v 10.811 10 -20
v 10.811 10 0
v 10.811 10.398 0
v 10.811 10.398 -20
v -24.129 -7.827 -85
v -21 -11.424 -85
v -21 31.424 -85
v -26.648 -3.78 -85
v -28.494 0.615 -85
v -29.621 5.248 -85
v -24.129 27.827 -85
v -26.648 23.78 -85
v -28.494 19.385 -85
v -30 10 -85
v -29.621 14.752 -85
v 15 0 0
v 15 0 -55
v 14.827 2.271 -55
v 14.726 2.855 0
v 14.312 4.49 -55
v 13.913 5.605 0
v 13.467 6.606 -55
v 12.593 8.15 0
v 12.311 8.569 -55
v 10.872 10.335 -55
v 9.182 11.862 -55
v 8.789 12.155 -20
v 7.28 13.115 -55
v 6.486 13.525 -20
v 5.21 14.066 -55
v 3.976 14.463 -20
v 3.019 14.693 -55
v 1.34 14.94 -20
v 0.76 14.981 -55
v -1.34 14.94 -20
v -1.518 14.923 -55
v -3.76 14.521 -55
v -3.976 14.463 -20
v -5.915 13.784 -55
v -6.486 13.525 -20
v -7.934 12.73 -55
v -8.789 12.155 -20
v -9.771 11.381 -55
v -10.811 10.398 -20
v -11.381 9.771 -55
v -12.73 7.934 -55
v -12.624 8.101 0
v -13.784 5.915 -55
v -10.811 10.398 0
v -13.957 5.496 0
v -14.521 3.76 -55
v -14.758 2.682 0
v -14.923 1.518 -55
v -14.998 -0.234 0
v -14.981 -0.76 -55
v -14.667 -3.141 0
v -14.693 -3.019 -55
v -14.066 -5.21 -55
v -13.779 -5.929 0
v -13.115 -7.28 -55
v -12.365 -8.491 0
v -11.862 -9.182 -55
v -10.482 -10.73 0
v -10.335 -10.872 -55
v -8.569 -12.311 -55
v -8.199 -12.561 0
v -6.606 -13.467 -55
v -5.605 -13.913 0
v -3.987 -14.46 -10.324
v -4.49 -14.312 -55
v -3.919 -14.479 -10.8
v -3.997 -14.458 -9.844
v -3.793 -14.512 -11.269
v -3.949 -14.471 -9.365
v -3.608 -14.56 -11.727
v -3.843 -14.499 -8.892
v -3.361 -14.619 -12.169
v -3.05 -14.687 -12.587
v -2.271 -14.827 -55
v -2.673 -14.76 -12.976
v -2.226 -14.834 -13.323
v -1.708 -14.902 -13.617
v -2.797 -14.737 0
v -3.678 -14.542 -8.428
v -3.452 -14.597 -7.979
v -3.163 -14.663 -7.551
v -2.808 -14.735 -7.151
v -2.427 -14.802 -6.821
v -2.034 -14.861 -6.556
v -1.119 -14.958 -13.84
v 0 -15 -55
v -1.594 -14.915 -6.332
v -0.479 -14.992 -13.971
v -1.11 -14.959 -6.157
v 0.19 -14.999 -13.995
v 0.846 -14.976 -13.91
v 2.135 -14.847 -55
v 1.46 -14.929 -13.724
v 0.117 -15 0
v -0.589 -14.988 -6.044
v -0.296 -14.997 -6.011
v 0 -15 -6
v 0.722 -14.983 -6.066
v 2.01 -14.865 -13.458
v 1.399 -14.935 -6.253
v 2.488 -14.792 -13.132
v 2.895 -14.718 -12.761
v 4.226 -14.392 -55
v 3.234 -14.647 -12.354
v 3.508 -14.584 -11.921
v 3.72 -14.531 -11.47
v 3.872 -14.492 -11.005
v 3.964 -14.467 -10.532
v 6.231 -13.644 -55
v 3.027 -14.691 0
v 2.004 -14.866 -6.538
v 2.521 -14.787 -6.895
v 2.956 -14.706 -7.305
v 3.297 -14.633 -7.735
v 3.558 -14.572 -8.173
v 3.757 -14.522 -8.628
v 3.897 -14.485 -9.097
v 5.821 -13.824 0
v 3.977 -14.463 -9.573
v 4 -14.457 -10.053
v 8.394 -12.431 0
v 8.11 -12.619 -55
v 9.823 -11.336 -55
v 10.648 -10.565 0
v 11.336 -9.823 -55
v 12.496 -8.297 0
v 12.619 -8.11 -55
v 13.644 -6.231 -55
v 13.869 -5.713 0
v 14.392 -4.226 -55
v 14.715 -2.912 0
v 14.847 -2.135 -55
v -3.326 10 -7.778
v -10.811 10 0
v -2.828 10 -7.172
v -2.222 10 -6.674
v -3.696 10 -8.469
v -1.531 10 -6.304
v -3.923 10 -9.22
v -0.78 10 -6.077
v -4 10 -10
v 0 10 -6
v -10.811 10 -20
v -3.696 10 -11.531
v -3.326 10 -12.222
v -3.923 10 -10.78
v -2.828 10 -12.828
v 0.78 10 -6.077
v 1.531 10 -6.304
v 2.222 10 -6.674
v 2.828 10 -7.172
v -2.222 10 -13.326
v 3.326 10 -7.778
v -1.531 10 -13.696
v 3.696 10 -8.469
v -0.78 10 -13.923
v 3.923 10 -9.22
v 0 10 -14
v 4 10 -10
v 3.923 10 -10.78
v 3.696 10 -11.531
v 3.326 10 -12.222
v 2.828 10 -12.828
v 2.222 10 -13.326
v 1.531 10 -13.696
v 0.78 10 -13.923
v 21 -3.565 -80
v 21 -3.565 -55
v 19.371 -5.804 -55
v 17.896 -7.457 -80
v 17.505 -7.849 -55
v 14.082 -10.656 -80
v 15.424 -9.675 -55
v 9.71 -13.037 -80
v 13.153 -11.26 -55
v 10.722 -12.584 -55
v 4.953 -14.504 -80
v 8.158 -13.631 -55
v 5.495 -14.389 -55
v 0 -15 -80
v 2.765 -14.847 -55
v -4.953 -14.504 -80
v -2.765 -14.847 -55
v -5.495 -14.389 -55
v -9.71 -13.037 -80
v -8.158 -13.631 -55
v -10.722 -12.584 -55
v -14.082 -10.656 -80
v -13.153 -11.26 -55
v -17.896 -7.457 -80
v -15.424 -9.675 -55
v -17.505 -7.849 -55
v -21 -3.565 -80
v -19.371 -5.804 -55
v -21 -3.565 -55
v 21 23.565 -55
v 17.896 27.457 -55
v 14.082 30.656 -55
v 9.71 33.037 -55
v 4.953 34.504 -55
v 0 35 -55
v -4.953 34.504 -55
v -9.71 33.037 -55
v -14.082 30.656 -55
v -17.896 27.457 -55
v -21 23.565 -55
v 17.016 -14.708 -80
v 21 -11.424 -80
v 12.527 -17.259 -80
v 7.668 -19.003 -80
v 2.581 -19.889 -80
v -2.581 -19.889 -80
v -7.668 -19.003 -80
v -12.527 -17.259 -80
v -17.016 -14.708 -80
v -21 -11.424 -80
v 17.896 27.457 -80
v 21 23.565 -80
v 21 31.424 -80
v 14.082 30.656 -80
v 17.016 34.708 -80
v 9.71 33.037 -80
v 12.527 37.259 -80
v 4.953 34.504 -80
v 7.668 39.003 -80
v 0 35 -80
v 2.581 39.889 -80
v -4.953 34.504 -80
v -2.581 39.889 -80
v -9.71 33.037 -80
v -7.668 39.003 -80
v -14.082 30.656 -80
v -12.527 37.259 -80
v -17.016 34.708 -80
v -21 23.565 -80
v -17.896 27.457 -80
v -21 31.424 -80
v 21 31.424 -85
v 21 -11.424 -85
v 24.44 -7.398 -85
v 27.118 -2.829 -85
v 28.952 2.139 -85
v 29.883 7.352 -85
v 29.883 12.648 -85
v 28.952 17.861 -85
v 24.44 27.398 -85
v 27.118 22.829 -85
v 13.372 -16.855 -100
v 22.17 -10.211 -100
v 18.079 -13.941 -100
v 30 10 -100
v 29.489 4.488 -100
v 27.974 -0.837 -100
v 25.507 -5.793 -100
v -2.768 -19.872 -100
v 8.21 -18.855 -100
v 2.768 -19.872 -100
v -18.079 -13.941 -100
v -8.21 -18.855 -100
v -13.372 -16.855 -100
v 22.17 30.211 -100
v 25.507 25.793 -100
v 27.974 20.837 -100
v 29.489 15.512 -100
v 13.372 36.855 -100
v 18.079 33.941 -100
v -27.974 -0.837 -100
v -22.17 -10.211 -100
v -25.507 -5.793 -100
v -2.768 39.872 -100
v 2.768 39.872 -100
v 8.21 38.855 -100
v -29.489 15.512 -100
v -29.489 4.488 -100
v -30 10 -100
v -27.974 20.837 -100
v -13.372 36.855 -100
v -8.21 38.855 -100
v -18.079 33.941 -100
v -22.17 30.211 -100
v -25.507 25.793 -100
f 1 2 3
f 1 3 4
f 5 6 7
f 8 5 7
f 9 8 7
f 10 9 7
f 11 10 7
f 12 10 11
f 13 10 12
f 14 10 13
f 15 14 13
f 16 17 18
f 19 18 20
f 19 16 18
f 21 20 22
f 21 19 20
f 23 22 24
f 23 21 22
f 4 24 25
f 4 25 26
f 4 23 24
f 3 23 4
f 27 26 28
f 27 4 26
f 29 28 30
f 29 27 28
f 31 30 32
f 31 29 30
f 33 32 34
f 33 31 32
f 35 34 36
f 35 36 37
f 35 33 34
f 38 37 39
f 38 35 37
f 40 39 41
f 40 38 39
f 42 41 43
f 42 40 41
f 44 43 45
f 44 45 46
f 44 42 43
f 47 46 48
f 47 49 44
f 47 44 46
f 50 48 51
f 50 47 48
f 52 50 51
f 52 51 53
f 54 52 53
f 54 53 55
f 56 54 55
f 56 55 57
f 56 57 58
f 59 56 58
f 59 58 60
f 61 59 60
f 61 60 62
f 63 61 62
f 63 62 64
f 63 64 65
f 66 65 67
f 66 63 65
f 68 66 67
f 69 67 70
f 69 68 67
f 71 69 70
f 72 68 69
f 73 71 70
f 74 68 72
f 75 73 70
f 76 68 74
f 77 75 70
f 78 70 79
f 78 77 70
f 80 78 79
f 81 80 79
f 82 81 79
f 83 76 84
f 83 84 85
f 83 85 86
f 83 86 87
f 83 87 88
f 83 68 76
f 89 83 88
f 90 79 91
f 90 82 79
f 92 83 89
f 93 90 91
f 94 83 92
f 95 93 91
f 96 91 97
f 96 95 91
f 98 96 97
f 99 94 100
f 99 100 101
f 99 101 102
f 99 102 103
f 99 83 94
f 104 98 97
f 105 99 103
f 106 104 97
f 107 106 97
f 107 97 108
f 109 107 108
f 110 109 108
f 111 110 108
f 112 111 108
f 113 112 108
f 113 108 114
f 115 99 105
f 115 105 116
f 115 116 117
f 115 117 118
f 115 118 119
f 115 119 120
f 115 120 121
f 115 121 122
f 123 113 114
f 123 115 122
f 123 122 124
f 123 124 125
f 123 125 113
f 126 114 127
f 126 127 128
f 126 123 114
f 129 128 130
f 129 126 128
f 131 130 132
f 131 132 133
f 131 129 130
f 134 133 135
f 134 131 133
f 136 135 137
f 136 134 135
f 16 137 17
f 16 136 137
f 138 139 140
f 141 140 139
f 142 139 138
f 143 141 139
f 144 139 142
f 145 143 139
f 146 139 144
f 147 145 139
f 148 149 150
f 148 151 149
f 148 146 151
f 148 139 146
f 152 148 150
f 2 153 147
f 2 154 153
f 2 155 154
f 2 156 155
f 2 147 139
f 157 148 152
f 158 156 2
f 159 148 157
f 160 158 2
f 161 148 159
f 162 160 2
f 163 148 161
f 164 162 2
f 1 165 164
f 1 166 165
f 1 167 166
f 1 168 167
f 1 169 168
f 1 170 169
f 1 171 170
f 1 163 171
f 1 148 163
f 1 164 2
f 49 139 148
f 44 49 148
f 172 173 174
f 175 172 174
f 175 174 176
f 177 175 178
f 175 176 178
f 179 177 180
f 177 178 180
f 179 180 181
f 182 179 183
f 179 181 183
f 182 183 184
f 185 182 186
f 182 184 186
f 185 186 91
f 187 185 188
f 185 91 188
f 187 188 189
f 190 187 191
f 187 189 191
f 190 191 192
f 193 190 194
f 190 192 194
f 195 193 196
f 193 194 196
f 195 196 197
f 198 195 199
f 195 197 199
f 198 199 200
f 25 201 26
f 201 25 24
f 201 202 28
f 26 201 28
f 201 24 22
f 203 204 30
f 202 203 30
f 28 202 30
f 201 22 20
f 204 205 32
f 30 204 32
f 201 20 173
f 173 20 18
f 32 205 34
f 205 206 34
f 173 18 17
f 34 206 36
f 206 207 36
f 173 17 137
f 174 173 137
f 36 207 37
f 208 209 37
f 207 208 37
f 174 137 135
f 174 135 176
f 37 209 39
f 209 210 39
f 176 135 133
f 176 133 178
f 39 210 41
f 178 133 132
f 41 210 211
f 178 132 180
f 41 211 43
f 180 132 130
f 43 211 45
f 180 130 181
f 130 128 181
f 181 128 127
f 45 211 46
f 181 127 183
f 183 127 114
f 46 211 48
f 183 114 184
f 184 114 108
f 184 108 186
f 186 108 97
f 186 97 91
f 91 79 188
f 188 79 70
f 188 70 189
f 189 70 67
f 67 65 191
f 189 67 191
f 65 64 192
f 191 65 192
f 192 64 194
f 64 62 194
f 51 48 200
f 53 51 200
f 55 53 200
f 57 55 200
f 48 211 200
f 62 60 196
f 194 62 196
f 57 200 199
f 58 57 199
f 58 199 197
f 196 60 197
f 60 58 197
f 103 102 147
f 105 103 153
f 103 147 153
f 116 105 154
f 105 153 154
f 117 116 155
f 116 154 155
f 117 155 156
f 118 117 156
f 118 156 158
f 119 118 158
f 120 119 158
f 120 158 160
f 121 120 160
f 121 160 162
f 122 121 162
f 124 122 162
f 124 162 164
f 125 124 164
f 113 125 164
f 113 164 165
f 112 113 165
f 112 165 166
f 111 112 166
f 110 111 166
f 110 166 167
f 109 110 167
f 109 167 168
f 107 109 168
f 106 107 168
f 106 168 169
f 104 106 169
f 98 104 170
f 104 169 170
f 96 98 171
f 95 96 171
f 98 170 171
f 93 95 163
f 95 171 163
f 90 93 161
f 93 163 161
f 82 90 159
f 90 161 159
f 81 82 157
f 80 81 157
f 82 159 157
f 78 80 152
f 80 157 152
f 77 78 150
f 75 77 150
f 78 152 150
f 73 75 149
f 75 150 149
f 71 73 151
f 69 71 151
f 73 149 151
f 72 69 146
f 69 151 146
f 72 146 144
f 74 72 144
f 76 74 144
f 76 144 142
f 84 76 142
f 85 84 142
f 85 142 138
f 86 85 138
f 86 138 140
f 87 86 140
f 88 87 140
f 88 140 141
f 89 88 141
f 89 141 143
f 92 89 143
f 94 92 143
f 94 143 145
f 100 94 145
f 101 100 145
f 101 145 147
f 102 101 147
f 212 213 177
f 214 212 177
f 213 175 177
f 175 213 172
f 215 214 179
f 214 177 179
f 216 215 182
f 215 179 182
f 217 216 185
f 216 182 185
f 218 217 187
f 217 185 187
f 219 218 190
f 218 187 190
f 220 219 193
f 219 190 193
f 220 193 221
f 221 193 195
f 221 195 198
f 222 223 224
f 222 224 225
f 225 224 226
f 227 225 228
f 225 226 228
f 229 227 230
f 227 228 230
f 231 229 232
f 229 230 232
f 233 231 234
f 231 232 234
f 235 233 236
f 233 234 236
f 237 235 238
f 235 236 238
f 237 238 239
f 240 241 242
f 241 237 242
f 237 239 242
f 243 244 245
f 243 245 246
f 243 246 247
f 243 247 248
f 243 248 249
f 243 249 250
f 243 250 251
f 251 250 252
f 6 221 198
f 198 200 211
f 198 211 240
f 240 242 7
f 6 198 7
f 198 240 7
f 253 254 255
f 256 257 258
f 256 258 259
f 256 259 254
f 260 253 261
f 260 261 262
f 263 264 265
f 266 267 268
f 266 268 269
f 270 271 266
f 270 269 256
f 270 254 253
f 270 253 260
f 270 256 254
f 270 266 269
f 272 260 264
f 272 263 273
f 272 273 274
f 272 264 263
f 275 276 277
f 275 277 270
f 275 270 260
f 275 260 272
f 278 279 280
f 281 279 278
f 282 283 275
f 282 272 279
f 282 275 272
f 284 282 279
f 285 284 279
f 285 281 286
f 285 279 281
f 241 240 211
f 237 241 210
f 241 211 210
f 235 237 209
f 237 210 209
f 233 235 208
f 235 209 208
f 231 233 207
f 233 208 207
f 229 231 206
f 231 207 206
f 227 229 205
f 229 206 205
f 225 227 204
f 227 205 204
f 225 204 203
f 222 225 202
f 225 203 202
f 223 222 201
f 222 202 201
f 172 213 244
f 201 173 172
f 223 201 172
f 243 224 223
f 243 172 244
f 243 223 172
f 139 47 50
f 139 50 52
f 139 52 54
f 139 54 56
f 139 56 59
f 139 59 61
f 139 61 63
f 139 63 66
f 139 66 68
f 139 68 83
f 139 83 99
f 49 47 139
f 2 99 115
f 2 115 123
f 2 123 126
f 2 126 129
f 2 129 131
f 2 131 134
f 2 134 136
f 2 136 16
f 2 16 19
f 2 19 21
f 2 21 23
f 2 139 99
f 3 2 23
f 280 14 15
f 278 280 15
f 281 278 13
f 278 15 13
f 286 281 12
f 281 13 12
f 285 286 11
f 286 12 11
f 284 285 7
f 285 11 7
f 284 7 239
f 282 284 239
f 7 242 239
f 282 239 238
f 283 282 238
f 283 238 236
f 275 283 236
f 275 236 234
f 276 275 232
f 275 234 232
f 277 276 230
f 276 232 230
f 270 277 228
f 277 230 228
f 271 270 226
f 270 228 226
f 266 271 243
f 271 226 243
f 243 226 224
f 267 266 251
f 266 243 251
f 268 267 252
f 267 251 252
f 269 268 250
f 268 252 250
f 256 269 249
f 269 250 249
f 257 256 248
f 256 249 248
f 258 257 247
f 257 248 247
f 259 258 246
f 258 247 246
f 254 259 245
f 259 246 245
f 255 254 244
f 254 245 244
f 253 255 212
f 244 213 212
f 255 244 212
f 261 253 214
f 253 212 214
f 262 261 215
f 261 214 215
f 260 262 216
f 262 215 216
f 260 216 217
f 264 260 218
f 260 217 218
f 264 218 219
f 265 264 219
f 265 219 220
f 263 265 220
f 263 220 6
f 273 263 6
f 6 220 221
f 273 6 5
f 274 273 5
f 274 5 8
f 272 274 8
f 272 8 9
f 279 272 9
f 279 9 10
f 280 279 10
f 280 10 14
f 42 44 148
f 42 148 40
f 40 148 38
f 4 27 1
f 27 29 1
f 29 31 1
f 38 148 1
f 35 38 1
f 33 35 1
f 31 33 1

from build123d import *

# Parameters (mm, degrees)
IZIM1_R                     = 15
Y_KSEKLIK_EKSTR_ZYON1_DEPTH = 55
IZIM2_R                     = 25
Y_KSEKLIK_EKSTR_ZYON2_DEPTH = 25
IZIM3_R                     = 30
Y_KSEKLIK_EKSTR_ZYON3_DEPTH = 20
IZIM4_W                     = 21.622627276
IZIM4_H                     = 20
KES_EKSTR_ZYON1_DEPTH       = 20
IZIM6_R                     = 4
KES_EKSTR_ZYON2_DEPTH       = 30
KES_EKSTR_ZYON3_DEPTH       = 30


with BuildPart() as part:
    # Çizim1 → Yükseklik-Ekstrüzyon1 (new body)
    with BuildSketch(Plane.XY):
        Circle(IZIM1_R)
    extrude(amount=-Y_KSEKLIK_EKSTR_ZYON1_DEPTH)

    # Çizim2 → Yükseklik-Ekstrüzyon2 (add)
    with BuildSketch(Plane(origin=(0, 0, -55), x_dir=(-1, 0, 0), z_dir=(0, 0, -1))):
        with Locations(Location((0, 10, 0), (0, 0, 270))):
            Circle(IZIM2_R)
    extrude(amount=Y_KSEKLIK_EKSTR_ZYON2_DEPTH)

    # Çizim3 → Yükseklik-Ekstrüzyon3 (add)
    with BuildSketch(Plane(origin=(0, 0, -80), x_dir=(-1, 0, 0), z_dir=(0, 0, -1))):
        with Locations((0, 10)):
            Circle(IZIM3_R)
    extrude(amount=Y_KSEKLIK_EKSTR_ZYON3_DEPTH)

    # Çizim4 → Kes-Ekstrüzyon1 (cut)
    with BuildSketch(Plane(origin=(0, 10, 0), x_dir=(1, 0, 0), z_dir=(0, 1, 0))):
        with Locations((0, 10)):
            Rectangle(IZIM4_W, IZIM4_H)
    extrude(amount=KES_EKSTR_ZYON1_DEPTH, mode=Mode.SUBTRACT)

    # Çizim6 → Kes-Ekstrüzyon2 (cut)
    with BuildSketch(Plane(origin=(0, 10, 0), x_dir=(1, 0, 0), z_dir=(0, 1, 0))):
        with Locations(Location((0, 10, 0), (0, 0, 270))):
            Circle(IZIM6_R)
    extrude(amount=-KES_EKSTR_ZYON2_DEPTH, mode=Mode.SUBTRACT)

    # Çizim7 → Kes-Ekstrüzyon3 (cut)
    with BuildSketch(Plane(origin=(21, 0, 0), x_dir=(0, 0, -1), z_dir=(1, 0, 0))):
        Polygon((55, -7.517008245), (80, -7.517008245), (80, -20), (85, -20), (85, 40), (80, 40), (80, 25), (55, 25), align=None)
    kes_ekstr_zyon3 = extrude(amount=KES_EKSTR_ZYON3_DEPTH, mode=Mode.SUBTRACT)

    # Aynalama1: Kes-Ekstrüzyon3 across plane
    add(kes_ekstr_zyon3.mirror(Plane(origin=(0, 0, 0), x_dir=(0, 0, 1), z_dir=(1, 0, 0))), mode=Mode.SUBTRACT)


solid = part.part
